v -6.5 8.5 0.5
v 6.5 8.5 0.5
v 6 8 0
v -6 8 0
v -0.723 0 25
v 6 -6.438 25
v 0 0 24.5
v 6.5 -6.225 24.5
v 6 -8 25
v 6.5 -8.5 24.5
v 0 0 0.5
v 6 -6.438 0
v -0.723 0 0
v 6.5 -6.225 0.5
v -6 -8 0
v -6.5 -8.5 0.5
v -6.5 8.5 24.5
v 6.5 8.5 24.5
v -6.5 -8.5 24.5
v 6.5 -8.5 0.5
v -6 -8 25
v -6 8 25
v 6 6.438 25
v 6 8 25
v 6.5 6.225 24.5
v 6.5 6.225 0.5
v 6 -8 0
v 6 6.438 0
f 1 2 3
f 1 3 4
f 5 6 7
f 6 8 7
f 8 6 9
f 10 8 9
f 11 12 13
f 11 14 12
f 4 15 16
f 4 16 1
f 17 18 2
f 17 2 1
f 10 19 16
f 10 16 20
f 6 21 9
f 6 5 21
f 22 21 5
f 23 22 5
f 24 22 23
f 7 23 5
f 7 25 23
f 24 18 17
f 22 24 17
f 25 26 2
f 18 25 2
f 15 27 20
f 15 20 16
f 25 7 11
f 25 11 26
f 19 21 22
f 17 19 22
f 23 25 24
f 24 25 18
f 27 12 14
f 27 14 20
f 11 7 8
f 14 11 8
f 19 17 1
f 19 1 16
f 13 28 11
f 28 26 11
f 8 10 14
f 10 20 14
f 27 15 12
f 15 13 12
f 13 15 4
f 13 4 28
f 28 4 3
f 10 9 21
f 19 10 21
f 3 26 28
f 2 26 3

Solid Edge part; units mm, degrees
sketch "Sketch1" plane through (0, 0, 0) normal (0, 0, 1) x (1, 0, 0)
  line L0 (-6.5, -8.5) -> (6.5, -8.5)
  line L1 (6.5, -8.5) -> (6.5, 8.5)
  line L2 (6.5, 8.5) -> (-6.5, 8.5)
  line L3 (-6.5, 8.5) -> (-6.5, -8.5)
extrude "Protrusion1" add sketch "Sketch1" along normal blind 25
sketch "Sketch2" plane through (0, 0, 25) normal (0, 0, 1) x (1, 0, 0)
  line L0 (0, 0) -> (6.5, -6.2249)
  line L1 (6.5, 6.2249) -> (6.5, -6.2249)
  line L2 (0, 0) -> (6.5, 6.2249)
extrude "ExtrudedCutout_1" cut sketch "Sketch2" against normal blind 29.2025
chamfer "Chamfer_1" distance 0.5 angle 45 14 edges at (3.25, 3.1125, 25) (3.25, -3.1125, 25) (6.5, 7.3625, 25) (0, 8.5, 25) (-6.5, 0, 25) (0, -8.5, 25) (6.5, -7.3625, 25) (0, -8.5, 0) (6.5, -7.3625, 0) (3.25, -3.1125, 0) (3.25, 3.1125, 0) (6.5, 7.3625, 0) (0, 8.5, 0) (-6.5, 0, 0)
